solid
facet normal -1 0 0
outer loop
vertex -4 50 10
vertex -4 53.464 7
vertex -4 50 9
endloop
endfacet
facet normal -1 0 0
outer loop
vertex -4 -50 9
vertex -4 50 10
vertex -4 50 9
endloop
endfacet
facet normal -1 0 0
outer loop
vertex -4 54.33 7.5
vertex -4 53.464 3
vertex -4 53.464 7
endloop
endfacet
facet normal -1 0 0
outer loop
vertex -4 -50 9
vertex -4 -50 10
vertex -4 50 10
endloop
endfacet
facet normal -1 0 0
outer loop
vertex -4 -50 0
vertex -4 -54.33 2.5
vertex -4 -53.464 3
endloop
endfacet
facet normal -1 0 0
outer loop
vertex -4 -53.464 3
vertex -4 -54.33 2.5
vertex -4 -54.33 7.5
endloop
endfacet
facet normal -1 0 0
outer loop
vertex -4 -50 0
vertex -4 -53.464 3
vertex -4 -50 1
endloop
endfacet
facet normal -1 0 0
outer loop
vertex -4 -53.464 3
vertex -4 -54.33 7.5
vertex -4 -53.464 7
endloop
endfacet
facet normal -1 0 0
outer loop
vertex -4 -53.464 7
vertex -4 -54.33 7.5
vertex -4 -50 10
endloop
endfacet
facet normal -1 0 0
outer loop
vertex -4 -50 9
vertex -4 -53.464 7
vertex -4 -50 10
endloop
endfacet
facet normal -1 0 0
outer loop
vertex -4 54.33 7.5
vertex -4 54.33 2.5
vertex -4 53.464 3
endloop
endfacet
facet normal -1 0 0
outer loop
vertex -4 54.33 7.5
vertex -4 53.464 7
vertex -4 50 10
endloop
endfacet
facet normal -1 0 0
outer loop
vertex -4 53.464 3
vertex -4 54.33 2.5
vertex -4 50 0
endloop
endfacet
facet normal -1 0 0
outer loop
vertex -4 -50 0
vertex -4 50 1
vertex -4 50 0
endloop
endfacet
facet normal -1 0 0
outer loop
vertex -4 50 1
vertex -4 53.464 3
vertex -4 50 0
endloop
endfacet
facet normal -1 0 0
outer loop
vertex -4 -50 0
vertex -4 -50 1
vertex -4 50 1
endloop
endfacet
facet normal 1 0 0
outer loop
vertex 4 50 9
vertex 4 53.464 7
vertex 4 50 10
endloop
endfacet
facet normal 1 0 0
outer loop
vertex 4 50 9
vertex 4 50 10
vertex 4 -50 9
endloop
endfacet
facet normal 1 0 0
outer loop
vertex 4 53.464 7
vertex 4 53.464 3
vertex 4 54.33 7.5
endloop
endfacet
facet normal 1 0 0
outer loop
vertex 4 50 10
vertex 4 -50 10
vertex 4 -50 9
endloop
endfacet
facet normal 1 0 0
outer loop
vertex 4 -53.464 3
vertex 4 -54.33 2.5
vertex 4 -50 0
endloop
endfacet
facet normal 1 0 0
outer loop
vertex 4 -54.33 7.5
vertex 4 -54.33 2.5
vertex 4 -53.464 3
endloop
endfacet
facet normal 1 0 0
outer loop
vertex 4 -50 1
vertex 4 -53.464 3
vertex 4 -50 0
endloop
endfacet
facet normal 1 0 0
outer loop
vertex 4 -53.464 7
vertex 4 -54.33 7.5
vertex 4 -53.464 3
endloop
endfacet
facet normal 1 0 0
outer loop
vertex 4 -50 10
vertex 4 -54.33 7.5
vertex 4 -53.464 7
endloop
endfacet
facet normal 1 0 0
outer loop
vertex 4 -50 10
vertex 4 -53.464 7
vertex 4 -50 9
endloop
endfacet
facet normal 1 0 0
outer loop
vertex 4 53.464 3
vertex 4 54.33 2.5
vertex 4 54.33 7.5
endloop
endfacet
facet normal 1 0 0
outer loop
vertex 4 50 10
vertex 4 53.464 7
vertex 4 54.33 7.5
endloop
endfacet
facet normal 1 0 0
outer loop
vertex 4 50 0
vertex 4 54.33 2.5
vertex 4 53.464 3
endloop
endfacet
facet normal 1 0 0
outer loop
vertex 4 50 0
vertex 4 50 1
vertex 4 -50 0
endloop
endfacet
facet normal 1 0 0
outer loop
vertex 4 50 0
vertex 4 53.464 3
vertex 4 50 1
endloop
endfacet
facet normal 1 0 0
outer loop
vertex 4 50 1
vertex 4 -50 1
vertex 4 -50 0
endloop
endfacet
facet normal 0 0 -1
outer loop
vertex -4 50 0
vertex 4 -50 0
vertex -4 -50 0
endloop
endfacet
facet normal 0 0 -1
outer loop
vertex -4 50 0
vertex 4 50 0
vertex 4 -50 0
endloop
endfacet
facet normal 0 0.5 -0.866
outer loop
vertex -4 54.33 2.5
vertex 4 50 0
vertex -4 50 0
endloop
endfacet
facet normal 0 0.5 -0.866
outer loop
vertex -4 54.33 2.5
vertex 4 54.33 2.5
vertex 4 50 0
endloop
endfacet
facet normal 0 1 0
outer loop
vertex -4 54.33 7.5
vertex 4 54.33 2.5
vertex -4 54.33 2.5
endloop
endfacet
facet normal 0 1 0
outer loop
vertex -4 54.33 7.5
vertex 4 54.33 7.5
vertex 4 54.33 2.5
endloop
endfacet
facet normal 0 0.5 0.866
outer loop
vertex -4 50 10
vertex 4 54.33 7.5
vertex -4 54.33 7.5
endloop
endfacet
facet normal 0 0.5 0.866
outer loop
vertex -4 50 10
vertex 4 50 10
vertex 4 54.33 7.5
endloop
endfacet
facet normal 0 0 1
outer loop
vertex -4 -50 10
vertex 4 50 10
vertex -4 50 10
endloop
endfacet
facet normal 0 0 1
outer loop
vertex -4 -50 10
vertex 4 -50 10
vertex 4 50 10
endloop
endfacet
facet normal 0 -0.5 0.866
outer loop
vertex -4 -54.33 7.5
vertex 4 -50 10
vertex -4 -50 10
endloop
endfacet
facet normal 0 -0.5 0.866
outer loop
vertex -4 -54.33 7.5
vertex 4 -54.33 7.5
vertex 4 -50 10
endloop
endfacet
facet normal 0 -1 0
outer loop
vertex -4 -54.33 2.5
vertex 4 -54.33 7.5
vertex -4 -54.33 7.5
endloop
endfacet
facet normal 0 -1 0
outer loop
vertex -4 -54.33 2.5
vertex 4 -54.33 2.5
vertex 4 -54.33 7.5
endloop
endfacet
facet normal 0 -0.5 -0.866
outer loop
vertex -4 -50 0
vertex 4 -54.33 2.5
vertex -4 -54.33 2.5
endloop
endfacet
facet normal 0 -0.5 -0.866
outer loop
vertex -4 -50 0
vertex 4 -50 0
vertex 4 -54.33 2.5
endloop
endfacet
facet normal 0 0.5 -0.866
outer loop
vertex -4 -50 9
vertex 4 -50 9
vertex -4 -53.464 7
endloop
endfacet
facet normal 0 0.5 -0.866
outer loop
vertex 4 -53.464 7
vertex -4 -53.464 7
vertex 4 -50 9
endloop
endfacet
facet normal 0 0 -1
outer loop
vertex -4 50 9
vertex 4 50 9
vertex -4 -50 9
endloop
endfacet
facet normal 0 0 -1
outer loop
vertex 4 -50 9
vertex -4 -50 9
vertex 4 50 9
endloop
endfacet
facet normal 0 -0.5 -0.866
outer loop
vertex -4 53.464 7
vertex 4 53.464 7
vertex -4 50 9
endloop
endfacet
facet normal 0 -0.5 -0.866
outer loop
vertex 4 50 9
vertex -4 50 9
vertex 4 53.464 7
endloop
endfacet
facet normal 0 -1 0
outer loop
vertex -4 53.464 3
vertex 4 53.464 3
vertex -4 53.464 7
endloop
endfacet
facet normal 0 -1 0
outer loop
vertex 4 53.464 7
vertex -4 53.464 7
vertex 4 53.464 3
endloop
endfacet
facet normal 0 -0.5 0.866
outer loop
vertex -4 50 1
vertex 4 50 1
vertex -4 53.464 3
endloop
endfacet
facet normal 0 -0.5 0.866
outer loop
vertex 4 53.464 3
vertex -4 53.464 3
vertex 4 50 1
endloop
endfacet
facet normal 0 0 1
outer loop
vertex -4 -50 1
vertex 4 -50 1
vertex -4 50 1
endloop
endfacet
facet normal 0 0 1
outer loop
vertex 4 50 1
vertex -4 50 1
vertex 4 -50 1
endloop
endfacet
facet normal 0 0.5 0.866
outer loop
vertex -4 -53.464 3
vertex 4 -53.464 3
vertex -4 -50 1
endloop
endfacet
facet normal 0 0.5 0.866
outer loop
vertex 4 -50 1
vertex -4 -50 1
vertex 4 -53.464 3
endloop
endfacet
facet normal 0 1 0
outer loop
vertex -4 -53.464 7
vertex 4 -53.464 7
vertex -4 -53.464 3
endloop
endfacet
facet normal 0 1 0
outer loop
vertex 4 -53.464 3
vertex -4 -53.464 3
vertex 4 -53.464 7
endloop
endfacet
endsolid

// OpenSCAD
// file: tank_wheel.scad
tank_wheel(10, 10, 2, 1);

module tank_wheel(wheel_width, wheel_diameter, track_thickness, track_inset)
{
    translate([-(wheel_width/2), 0 ,wheel_diameter/2])
    rotate([0,90,0])
    {
        linear_extrude(height = track_inset, scale = 1.0)
        circle(d=wheel_diameter, false);
        
        translate([0, 0, track_inset])
        linear_extrude(height = wheel_width - (2 * track_inset), scale = 1.0)
        circle(d=wheel_diameter - track_thickness, false);
        
        translate([0, 0, wheel_width - track_inset])
        linear_extrude(height = track_inset, scale = 1.0)
        circle(d=wheel_diameter, false);
    }
}
// main file
use <tank_wheel.scad>

tank_track(10, 10, 100, 1, 1);

module tank_track(wheel_width, wheel_diameter, track_length, track_thickness, track_inset)
{
    segments = $fn>3 ? $fn : 3;
    
    outer_points = [[-wheel_diameter,-(track_length / 2)],
                    [-wheel_diameter,(track_length / 2)], 
                    for (theta = [90 : -(180/segments) : -90]) 
                        [-wheel_diameter + (wheel_diameter / 2) + (sin(theta) * (wheel_diameter / 2)), (track_length / 2) + cos(theta) * (wheel_diameter / 2)], 
                    [0, (track_length / 2)], 
                    [0, -(track_length / 2)], 
                    for (theta = [-90 : -(180/segments) : -270]) 
                        [-wheel_diameter + (wheel_diameter / 2) + (sin(theta) * (wheel_diameter / 2)), -(track_length / 2) + cos(theta) * (wheel_diameter / 2)]];

    inner_points = [[-wheel_diameter + track_thickness,-(track_length / 2)],
                    [-wheel_diameter + track_thickness,(track_length / 2)], 
                    for (theta = [90 : -(180/segments) : -90]) 
                        [-wheel_diameter + (wheel_diameter / 2) + (sin(theta) * ((wheel_diameter / 2) -track_thickness)), (track_length / 2) + cos(theta) * ((wheel_diameter / 2) -track_thickness)], 
                    [0 - track_thickness, (track_length / 2)], 
                    [0 - track_thickness, -(track_length / 2)], 
                    for (theta = [-90 : -(180/segments) : -270]) 
                        [-wheel_diameter + (wheel_diameter / 2) + (sin(theta) * ((wheel_diameter / 2) -track_thickness)), -(track_length / 2) + cos(theta) * ((wheel_diameter / 2) - track_thickness)]];

    color("black", 1.0)
    translate([-(wheel_width/2) + track_inset, 0, 0])
    rotate([0,90,0])
    linear_extrude(wheel_width - (2 * track_inset), scale = 1.0)
    difference()
    {
        polygon(outer_points);
        polygon(inner_points);
    }
//    polygon(points, paths);
}
